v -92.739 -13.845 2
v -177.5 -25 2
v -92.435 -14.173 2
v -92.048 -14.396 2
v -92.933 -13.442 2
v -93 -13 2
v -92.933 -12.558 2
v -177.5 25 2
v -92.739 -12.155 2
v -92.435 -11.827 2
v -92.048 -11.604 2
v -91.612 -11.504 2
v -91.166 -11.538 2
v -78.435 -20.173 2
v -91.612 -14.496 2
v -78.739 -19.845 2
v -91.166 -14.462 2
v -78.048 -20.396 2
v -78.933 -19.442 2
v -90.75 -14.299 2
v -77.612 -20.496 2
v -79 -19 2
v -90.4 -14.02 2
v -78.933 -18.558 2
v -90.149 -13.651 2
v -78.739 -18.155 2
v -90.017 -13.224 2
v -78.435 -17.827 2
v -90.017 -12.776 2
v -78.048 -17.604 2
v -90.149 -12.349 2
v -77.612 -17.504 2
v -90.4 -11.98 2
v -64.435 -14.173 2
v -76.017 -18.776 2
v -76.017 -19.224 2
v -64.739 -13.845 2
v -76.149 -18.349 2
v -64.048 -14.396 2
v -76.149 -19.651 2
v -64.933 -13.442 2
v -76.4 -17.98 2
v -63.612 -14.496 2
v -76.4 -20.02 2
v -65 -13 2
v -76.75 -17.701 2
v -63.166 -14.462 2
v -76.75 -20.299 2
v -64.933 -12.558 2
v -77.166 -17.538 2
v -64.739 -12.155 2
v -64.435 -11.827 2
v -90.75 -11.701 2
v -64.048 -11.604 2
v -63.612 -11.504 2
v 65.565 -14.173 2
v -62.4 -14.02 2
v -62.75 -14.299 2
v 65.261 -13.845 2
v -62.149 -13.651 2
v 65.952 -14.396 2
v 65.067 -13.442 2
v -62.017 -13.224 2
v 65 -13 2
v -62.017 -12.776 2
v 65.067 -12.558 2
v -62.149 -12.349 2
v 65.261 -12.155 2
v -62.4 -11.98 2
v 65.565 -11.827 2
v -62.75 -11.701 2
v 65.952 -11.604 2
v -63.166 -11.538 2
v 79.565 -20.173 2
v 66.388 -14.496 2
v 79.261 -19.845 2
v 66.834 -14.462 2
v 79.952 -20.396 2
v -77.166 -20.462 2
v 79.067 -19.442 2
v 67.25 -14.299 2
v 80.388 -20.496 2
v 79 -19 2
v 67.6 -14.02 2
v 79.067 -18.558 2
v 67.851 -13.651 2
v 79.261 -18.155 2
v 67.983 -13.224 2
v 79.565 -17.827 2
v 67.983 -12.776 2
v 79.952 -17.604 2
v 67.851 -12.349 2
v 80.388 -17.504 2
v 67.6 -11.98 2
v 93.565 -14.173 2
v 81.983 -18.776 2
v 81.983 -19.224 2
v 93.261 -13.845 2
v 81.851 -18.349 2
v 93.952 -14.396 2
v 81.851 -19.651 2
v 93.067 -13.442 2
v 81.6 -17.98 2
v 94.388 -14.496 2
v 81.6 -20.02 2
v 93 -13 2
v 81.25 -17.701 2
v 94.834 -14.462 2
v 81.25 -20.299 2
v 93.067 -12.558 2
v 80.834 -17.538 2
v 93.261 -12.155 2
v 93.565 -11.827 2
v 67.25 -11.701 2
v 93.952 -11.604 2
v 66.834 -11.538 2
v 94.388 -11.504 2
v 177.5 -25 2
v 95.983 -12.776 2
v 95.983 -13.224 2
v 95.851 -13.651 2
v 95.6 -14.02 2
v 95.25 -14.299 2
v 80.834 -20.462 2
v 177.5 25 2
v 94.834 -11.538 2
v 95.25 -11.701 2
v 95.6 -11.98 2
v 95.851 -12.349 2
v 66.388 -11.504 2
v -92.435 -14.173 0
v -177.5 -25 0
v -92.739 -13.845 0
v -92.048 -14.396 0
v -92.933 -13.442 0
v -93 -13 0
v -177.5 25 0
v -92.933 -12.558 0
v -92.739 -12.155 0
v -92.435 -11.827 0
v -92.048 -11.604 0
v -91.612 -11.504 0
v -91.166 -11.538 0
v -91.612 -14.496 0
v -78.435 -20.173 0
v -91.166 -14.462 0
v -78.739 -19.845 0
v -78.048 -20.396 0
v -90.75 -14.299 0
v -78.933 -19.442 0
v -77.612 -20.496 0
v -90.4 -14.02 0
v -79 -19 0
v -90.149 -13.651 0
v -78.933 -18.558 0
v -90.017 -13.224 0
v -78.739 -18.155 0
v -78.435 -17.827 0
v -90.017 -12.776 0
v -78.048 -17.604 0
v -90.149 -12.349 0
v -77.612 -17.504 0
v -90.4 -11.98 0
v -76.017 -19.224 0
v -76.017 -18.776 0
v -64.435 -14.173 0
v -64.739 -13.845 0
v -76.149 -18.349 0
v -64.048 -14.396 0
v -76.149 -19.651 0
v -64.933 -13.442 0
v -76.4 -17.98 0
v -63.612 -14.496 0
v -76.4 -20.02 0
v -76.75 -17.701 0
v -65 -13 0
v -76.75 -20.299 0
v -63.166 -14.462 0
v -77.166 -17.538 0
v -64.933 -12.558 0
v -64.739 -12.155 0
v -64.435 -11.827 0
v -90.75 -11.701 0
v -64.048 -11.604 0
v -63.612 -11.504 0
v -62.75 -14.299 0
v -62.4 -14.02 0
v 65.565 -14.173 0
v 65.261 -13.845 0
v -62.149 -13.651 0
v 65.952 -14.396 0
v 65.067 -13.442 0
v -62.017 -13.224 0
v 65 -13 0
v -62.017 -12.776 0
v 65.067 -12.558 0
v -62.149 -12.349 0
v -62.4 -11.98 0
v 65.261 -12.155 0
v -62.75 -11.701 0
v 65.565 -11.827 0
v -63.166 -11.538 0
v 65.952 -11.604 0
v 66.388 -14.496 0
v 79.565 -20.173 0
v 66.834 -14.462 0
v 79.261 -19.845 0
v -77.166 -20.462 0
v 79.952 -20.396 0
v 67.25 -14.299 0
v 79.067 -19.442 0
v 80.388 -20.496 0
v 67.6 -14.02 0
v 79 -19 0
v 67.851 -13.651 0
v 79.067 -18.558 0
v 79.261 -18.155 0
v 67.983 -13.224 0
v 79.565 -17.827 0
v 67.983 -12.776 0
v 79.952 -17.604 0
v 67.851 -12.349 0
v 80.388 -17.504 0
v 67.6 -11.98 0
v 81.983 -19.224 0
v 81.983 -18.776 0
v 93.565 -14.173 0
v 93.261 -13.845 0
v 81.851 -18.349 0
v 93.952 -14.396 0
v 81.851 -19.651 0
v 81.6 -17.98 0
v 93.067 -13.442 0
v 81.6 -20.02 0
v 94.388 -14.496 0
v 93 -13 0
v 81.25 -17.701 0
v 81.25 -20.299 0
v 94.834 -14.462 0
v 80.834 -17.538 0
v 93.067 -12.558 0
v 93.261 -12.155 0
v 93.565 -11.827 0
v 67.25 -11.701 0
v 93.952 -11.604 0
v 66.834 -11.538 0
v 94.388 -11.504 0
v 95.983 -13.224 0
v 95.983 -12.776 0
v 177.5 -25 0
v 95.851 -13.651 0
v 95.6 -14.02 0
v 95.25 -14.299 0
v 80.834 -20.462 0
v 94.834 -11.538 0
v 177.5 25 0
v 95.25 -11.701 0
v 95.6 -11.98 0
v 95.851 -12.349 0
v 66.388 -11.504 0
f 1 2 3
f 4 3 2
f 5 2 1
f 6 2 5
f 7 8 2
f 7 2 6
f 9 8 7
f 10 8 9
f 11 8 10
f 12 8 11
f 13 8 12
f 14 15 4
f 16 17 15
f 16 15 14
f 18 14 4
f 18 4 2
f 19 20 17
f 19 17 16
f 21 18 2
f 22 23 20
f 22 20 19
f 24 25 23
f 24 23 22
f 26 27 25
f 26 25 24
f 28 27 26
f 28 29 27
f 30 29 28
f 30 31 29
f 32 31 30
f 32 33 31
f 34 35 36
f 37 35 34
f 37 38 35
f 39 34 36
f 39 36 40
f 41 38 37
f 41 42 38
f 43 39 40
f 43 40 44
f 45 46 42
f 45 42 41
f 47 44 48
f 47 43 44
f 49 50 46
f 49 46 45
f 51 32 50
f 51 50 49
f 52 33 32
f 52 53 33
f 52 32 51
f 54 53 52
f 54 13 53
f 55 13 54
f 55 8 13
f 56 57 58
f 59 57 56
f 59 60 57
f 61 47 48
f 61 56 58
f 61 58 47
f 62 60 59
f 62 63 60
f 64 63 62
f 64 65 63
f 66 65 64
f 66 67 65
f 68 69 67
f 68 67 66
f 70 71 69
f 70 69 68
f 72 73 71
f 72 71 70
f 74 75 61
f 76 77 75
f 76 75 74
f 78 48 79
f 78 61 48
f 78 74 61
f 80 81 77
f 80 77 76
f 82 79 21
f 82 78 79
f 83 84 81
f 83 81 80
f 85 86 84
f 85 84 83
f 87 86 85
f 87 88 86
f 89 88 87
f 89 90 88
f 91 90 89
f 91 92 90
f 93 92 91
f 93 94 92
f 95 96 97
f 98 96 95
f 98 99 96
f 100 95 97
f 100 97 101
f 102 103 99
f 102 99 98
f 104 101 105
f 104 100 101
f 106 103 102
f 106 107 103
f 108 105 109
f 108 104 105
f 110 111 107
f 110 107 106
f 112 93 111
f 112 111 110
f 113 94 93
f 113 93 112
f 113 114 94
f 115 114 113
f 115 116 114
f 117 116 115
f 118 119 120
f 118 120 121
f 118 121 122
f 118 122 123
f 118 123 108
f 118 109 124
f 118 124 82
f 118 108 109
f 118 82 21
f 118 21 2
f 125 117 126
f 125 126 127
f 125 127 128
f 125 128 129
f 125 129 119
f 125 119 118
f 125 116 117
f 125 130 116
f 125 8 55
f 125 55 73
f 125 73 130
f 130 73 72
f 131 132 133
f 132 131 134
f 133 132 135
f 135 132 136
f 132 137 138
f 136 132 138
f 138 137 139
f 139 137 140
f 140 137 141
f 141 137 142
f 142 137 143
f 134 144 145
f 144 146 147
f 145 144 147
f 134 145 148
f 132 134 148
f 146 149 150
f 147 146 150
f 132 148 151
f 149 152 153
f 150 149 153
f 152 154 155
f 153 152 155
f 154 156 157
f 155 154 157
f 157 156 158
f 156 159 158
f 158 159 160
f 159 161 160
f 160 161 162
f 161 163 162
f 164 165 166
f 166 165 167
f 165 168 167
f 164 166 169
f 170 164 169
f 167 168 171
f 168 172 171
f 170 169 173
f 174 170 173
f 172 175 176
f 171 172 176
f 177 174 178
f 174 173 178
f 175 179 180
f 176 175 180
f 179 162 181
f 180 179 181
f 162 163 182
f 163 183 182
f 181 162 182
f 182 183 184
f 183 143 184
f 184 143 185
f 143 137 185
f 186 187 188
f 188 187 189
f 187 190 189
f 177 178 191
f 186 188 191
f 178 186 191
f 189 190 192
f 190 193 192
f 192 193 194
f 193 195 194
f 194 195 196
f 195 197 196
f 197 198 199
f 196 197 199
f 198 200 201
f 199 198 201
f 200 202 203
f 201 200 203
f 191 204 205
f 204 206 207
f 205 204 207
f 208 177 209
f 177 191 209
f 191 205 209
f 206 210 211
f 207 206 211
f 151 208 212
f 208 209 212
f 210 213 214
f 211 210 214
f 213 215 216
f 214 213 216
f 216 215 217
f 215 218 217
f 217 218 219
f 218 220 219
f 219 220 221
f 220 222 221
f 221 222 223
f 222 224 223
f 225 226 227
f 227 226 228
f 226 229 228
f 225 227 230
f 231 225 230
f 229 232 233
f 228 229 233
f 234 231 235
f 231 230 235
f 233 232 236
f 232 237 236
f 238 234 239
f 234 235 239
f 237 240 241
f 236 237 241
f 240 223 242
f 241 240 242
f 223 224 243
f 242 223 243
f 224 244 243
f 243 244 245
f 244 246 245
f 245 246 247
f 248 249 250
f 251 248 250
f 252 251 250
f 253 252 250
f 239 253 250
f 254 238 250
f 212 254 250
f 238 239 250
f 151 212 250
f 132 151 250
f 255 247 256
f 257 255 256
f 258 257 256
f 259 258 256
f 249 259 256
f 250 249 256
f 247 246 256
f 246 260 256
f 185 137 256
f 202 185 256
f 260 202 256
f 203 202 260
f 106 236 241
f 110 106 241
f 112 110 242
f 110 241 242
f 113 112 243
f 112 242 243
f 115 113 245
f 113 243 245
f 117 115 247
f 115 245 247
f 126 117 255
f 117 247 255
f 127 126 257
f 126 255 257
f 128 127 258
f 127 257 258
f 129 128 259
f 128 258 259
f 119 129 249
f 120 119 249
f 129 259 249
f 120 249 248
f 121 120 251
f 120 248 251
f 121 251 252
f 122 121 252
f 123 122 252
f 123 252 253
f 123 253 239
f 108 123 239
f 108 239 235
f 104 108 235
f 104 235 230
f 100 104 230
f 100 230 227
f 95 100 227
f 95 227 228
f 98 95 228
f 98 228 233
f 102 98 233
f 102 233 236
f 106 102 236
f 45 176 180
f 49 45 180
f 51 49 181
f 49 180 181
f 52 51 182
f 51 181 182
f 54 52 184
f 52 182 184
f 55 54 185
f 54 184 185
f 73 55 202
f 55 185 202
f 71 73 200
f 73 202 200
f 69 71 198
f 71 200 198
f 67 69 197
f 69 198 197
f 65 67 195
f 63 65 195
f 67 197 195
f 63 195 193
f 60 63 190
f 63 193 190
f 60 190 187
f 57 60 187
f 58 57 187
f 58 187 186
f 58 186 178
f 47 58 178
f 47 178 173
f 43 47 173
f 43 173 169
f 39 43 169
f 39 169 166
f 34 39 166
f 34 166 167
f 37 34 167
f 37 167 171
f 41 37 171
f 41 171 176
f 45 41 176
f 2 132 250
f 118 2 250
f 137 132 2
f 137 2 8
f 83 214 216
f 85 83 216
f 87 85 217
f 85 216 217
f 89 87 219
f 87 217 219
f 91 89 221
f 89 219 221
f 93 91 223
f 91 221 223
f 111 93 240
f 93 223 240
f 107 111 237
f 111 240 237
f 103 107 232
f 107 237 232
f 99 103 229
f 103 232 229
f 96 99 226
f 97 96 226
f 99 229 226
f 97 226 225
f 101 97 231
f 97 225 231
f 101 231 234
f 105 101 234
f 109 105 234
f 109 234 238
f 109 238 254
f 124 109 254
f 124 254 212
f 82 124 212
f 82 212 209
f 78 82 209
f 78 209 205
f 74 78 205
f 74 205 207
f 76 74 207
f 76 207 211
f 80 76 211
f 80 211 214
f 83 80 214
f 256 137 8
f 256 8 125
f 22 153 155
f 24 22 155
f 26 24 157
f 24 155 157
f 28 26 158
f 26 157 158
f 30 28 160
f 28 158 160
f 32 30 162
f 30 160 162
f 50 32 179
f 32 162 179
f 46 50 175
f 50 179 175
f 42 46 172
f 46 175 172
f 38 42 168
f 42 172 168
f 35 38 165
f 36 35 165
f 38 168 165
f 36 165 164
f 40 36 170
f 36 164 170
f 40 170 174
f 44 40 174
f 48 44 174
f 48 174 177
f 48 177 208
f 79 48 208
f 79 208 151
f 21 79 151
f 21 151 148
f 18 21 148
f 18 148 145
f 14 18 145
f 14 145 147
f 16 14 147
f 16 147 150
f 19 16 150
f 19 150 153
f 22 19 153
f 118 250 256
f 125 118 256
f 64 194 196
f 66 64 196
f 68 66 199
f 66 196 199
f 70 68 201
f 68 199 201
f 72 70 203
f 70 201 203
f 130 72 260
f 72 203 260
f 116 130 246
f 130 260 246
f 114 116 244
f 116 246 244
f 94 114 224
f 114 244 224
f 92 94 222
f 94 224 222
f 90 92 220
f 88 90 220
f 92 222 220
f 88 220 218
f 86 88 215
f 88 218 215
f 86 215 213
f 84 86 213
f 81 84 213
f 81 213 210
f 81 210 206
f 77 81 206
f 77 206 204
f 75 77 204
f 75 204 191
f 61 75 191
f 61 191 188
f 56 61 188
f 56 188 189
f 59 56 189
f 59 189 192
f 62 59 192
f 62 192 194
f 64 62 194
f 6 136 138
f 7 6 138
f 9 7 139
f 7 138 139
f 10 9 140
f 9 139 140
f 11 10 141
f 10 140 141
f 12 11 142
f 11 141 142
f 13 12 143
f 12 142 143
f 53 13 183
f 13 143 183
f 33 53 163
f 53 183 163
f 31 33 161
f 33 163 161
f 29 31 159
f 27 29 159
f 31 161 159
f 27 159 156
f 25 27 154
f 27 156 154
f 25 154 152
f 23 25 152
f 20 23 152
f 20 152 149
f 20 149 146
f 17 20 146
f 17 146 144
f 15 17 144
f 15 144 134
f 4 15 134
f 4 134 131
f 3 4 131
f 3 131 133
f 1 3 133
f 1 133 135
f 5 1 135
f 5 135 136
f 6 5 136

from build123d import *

# Parameters (mm, degrees)
ESQUISSE1_W             = 355
ESQUISSE1_H             = 50
BOSS_EXTRU_1_DEPTH      = 2
ESQUISSE2_R             = 1.5
ENL_V_MAT_EXTRU_1_DEPTH = 180.263074837


with BuildPart() as part:
    # Esquisse1 → Boss.-Extru.1 (new body)
    with BuildSketch(Plane.XY):
        Rectangle(ESQUISSE1_W, ESQUISSE1_H)
    extrude(amount=BOSS_EXTRU_1_DEPTH)

    # Esquisse2 → Enlèv. mat.-Extru.1 (cut, through all)
    with BuildSketch(Plane(origin=(0, 0, 0), x_dir=(-1, 0, 0), z_dir=(0, 0, -1))):
        with Locations((-94.5, -13)):
            Circle(ESQUISSE2_R)
        with Locations((-80.5, -19)):
            Circle(ESQUISSE2_R)
        with Locations((-66.5, -13)):
            Circle(ESQUISSE2_R)
        with Locations((77.5, -19)):
            Circle(ESQUISSE2_R)
        with Locations((63.5, -13)):
            Circle(ESQUISSE2_R)
        with Locations((91.5, -13)):
            Circle(ESQUISSE2_R)
    extrude(amount=-ENL_V_MAT_EXTRU_1_DEPTH, mode=Mode.SUBTRACT)


solid = part.part
